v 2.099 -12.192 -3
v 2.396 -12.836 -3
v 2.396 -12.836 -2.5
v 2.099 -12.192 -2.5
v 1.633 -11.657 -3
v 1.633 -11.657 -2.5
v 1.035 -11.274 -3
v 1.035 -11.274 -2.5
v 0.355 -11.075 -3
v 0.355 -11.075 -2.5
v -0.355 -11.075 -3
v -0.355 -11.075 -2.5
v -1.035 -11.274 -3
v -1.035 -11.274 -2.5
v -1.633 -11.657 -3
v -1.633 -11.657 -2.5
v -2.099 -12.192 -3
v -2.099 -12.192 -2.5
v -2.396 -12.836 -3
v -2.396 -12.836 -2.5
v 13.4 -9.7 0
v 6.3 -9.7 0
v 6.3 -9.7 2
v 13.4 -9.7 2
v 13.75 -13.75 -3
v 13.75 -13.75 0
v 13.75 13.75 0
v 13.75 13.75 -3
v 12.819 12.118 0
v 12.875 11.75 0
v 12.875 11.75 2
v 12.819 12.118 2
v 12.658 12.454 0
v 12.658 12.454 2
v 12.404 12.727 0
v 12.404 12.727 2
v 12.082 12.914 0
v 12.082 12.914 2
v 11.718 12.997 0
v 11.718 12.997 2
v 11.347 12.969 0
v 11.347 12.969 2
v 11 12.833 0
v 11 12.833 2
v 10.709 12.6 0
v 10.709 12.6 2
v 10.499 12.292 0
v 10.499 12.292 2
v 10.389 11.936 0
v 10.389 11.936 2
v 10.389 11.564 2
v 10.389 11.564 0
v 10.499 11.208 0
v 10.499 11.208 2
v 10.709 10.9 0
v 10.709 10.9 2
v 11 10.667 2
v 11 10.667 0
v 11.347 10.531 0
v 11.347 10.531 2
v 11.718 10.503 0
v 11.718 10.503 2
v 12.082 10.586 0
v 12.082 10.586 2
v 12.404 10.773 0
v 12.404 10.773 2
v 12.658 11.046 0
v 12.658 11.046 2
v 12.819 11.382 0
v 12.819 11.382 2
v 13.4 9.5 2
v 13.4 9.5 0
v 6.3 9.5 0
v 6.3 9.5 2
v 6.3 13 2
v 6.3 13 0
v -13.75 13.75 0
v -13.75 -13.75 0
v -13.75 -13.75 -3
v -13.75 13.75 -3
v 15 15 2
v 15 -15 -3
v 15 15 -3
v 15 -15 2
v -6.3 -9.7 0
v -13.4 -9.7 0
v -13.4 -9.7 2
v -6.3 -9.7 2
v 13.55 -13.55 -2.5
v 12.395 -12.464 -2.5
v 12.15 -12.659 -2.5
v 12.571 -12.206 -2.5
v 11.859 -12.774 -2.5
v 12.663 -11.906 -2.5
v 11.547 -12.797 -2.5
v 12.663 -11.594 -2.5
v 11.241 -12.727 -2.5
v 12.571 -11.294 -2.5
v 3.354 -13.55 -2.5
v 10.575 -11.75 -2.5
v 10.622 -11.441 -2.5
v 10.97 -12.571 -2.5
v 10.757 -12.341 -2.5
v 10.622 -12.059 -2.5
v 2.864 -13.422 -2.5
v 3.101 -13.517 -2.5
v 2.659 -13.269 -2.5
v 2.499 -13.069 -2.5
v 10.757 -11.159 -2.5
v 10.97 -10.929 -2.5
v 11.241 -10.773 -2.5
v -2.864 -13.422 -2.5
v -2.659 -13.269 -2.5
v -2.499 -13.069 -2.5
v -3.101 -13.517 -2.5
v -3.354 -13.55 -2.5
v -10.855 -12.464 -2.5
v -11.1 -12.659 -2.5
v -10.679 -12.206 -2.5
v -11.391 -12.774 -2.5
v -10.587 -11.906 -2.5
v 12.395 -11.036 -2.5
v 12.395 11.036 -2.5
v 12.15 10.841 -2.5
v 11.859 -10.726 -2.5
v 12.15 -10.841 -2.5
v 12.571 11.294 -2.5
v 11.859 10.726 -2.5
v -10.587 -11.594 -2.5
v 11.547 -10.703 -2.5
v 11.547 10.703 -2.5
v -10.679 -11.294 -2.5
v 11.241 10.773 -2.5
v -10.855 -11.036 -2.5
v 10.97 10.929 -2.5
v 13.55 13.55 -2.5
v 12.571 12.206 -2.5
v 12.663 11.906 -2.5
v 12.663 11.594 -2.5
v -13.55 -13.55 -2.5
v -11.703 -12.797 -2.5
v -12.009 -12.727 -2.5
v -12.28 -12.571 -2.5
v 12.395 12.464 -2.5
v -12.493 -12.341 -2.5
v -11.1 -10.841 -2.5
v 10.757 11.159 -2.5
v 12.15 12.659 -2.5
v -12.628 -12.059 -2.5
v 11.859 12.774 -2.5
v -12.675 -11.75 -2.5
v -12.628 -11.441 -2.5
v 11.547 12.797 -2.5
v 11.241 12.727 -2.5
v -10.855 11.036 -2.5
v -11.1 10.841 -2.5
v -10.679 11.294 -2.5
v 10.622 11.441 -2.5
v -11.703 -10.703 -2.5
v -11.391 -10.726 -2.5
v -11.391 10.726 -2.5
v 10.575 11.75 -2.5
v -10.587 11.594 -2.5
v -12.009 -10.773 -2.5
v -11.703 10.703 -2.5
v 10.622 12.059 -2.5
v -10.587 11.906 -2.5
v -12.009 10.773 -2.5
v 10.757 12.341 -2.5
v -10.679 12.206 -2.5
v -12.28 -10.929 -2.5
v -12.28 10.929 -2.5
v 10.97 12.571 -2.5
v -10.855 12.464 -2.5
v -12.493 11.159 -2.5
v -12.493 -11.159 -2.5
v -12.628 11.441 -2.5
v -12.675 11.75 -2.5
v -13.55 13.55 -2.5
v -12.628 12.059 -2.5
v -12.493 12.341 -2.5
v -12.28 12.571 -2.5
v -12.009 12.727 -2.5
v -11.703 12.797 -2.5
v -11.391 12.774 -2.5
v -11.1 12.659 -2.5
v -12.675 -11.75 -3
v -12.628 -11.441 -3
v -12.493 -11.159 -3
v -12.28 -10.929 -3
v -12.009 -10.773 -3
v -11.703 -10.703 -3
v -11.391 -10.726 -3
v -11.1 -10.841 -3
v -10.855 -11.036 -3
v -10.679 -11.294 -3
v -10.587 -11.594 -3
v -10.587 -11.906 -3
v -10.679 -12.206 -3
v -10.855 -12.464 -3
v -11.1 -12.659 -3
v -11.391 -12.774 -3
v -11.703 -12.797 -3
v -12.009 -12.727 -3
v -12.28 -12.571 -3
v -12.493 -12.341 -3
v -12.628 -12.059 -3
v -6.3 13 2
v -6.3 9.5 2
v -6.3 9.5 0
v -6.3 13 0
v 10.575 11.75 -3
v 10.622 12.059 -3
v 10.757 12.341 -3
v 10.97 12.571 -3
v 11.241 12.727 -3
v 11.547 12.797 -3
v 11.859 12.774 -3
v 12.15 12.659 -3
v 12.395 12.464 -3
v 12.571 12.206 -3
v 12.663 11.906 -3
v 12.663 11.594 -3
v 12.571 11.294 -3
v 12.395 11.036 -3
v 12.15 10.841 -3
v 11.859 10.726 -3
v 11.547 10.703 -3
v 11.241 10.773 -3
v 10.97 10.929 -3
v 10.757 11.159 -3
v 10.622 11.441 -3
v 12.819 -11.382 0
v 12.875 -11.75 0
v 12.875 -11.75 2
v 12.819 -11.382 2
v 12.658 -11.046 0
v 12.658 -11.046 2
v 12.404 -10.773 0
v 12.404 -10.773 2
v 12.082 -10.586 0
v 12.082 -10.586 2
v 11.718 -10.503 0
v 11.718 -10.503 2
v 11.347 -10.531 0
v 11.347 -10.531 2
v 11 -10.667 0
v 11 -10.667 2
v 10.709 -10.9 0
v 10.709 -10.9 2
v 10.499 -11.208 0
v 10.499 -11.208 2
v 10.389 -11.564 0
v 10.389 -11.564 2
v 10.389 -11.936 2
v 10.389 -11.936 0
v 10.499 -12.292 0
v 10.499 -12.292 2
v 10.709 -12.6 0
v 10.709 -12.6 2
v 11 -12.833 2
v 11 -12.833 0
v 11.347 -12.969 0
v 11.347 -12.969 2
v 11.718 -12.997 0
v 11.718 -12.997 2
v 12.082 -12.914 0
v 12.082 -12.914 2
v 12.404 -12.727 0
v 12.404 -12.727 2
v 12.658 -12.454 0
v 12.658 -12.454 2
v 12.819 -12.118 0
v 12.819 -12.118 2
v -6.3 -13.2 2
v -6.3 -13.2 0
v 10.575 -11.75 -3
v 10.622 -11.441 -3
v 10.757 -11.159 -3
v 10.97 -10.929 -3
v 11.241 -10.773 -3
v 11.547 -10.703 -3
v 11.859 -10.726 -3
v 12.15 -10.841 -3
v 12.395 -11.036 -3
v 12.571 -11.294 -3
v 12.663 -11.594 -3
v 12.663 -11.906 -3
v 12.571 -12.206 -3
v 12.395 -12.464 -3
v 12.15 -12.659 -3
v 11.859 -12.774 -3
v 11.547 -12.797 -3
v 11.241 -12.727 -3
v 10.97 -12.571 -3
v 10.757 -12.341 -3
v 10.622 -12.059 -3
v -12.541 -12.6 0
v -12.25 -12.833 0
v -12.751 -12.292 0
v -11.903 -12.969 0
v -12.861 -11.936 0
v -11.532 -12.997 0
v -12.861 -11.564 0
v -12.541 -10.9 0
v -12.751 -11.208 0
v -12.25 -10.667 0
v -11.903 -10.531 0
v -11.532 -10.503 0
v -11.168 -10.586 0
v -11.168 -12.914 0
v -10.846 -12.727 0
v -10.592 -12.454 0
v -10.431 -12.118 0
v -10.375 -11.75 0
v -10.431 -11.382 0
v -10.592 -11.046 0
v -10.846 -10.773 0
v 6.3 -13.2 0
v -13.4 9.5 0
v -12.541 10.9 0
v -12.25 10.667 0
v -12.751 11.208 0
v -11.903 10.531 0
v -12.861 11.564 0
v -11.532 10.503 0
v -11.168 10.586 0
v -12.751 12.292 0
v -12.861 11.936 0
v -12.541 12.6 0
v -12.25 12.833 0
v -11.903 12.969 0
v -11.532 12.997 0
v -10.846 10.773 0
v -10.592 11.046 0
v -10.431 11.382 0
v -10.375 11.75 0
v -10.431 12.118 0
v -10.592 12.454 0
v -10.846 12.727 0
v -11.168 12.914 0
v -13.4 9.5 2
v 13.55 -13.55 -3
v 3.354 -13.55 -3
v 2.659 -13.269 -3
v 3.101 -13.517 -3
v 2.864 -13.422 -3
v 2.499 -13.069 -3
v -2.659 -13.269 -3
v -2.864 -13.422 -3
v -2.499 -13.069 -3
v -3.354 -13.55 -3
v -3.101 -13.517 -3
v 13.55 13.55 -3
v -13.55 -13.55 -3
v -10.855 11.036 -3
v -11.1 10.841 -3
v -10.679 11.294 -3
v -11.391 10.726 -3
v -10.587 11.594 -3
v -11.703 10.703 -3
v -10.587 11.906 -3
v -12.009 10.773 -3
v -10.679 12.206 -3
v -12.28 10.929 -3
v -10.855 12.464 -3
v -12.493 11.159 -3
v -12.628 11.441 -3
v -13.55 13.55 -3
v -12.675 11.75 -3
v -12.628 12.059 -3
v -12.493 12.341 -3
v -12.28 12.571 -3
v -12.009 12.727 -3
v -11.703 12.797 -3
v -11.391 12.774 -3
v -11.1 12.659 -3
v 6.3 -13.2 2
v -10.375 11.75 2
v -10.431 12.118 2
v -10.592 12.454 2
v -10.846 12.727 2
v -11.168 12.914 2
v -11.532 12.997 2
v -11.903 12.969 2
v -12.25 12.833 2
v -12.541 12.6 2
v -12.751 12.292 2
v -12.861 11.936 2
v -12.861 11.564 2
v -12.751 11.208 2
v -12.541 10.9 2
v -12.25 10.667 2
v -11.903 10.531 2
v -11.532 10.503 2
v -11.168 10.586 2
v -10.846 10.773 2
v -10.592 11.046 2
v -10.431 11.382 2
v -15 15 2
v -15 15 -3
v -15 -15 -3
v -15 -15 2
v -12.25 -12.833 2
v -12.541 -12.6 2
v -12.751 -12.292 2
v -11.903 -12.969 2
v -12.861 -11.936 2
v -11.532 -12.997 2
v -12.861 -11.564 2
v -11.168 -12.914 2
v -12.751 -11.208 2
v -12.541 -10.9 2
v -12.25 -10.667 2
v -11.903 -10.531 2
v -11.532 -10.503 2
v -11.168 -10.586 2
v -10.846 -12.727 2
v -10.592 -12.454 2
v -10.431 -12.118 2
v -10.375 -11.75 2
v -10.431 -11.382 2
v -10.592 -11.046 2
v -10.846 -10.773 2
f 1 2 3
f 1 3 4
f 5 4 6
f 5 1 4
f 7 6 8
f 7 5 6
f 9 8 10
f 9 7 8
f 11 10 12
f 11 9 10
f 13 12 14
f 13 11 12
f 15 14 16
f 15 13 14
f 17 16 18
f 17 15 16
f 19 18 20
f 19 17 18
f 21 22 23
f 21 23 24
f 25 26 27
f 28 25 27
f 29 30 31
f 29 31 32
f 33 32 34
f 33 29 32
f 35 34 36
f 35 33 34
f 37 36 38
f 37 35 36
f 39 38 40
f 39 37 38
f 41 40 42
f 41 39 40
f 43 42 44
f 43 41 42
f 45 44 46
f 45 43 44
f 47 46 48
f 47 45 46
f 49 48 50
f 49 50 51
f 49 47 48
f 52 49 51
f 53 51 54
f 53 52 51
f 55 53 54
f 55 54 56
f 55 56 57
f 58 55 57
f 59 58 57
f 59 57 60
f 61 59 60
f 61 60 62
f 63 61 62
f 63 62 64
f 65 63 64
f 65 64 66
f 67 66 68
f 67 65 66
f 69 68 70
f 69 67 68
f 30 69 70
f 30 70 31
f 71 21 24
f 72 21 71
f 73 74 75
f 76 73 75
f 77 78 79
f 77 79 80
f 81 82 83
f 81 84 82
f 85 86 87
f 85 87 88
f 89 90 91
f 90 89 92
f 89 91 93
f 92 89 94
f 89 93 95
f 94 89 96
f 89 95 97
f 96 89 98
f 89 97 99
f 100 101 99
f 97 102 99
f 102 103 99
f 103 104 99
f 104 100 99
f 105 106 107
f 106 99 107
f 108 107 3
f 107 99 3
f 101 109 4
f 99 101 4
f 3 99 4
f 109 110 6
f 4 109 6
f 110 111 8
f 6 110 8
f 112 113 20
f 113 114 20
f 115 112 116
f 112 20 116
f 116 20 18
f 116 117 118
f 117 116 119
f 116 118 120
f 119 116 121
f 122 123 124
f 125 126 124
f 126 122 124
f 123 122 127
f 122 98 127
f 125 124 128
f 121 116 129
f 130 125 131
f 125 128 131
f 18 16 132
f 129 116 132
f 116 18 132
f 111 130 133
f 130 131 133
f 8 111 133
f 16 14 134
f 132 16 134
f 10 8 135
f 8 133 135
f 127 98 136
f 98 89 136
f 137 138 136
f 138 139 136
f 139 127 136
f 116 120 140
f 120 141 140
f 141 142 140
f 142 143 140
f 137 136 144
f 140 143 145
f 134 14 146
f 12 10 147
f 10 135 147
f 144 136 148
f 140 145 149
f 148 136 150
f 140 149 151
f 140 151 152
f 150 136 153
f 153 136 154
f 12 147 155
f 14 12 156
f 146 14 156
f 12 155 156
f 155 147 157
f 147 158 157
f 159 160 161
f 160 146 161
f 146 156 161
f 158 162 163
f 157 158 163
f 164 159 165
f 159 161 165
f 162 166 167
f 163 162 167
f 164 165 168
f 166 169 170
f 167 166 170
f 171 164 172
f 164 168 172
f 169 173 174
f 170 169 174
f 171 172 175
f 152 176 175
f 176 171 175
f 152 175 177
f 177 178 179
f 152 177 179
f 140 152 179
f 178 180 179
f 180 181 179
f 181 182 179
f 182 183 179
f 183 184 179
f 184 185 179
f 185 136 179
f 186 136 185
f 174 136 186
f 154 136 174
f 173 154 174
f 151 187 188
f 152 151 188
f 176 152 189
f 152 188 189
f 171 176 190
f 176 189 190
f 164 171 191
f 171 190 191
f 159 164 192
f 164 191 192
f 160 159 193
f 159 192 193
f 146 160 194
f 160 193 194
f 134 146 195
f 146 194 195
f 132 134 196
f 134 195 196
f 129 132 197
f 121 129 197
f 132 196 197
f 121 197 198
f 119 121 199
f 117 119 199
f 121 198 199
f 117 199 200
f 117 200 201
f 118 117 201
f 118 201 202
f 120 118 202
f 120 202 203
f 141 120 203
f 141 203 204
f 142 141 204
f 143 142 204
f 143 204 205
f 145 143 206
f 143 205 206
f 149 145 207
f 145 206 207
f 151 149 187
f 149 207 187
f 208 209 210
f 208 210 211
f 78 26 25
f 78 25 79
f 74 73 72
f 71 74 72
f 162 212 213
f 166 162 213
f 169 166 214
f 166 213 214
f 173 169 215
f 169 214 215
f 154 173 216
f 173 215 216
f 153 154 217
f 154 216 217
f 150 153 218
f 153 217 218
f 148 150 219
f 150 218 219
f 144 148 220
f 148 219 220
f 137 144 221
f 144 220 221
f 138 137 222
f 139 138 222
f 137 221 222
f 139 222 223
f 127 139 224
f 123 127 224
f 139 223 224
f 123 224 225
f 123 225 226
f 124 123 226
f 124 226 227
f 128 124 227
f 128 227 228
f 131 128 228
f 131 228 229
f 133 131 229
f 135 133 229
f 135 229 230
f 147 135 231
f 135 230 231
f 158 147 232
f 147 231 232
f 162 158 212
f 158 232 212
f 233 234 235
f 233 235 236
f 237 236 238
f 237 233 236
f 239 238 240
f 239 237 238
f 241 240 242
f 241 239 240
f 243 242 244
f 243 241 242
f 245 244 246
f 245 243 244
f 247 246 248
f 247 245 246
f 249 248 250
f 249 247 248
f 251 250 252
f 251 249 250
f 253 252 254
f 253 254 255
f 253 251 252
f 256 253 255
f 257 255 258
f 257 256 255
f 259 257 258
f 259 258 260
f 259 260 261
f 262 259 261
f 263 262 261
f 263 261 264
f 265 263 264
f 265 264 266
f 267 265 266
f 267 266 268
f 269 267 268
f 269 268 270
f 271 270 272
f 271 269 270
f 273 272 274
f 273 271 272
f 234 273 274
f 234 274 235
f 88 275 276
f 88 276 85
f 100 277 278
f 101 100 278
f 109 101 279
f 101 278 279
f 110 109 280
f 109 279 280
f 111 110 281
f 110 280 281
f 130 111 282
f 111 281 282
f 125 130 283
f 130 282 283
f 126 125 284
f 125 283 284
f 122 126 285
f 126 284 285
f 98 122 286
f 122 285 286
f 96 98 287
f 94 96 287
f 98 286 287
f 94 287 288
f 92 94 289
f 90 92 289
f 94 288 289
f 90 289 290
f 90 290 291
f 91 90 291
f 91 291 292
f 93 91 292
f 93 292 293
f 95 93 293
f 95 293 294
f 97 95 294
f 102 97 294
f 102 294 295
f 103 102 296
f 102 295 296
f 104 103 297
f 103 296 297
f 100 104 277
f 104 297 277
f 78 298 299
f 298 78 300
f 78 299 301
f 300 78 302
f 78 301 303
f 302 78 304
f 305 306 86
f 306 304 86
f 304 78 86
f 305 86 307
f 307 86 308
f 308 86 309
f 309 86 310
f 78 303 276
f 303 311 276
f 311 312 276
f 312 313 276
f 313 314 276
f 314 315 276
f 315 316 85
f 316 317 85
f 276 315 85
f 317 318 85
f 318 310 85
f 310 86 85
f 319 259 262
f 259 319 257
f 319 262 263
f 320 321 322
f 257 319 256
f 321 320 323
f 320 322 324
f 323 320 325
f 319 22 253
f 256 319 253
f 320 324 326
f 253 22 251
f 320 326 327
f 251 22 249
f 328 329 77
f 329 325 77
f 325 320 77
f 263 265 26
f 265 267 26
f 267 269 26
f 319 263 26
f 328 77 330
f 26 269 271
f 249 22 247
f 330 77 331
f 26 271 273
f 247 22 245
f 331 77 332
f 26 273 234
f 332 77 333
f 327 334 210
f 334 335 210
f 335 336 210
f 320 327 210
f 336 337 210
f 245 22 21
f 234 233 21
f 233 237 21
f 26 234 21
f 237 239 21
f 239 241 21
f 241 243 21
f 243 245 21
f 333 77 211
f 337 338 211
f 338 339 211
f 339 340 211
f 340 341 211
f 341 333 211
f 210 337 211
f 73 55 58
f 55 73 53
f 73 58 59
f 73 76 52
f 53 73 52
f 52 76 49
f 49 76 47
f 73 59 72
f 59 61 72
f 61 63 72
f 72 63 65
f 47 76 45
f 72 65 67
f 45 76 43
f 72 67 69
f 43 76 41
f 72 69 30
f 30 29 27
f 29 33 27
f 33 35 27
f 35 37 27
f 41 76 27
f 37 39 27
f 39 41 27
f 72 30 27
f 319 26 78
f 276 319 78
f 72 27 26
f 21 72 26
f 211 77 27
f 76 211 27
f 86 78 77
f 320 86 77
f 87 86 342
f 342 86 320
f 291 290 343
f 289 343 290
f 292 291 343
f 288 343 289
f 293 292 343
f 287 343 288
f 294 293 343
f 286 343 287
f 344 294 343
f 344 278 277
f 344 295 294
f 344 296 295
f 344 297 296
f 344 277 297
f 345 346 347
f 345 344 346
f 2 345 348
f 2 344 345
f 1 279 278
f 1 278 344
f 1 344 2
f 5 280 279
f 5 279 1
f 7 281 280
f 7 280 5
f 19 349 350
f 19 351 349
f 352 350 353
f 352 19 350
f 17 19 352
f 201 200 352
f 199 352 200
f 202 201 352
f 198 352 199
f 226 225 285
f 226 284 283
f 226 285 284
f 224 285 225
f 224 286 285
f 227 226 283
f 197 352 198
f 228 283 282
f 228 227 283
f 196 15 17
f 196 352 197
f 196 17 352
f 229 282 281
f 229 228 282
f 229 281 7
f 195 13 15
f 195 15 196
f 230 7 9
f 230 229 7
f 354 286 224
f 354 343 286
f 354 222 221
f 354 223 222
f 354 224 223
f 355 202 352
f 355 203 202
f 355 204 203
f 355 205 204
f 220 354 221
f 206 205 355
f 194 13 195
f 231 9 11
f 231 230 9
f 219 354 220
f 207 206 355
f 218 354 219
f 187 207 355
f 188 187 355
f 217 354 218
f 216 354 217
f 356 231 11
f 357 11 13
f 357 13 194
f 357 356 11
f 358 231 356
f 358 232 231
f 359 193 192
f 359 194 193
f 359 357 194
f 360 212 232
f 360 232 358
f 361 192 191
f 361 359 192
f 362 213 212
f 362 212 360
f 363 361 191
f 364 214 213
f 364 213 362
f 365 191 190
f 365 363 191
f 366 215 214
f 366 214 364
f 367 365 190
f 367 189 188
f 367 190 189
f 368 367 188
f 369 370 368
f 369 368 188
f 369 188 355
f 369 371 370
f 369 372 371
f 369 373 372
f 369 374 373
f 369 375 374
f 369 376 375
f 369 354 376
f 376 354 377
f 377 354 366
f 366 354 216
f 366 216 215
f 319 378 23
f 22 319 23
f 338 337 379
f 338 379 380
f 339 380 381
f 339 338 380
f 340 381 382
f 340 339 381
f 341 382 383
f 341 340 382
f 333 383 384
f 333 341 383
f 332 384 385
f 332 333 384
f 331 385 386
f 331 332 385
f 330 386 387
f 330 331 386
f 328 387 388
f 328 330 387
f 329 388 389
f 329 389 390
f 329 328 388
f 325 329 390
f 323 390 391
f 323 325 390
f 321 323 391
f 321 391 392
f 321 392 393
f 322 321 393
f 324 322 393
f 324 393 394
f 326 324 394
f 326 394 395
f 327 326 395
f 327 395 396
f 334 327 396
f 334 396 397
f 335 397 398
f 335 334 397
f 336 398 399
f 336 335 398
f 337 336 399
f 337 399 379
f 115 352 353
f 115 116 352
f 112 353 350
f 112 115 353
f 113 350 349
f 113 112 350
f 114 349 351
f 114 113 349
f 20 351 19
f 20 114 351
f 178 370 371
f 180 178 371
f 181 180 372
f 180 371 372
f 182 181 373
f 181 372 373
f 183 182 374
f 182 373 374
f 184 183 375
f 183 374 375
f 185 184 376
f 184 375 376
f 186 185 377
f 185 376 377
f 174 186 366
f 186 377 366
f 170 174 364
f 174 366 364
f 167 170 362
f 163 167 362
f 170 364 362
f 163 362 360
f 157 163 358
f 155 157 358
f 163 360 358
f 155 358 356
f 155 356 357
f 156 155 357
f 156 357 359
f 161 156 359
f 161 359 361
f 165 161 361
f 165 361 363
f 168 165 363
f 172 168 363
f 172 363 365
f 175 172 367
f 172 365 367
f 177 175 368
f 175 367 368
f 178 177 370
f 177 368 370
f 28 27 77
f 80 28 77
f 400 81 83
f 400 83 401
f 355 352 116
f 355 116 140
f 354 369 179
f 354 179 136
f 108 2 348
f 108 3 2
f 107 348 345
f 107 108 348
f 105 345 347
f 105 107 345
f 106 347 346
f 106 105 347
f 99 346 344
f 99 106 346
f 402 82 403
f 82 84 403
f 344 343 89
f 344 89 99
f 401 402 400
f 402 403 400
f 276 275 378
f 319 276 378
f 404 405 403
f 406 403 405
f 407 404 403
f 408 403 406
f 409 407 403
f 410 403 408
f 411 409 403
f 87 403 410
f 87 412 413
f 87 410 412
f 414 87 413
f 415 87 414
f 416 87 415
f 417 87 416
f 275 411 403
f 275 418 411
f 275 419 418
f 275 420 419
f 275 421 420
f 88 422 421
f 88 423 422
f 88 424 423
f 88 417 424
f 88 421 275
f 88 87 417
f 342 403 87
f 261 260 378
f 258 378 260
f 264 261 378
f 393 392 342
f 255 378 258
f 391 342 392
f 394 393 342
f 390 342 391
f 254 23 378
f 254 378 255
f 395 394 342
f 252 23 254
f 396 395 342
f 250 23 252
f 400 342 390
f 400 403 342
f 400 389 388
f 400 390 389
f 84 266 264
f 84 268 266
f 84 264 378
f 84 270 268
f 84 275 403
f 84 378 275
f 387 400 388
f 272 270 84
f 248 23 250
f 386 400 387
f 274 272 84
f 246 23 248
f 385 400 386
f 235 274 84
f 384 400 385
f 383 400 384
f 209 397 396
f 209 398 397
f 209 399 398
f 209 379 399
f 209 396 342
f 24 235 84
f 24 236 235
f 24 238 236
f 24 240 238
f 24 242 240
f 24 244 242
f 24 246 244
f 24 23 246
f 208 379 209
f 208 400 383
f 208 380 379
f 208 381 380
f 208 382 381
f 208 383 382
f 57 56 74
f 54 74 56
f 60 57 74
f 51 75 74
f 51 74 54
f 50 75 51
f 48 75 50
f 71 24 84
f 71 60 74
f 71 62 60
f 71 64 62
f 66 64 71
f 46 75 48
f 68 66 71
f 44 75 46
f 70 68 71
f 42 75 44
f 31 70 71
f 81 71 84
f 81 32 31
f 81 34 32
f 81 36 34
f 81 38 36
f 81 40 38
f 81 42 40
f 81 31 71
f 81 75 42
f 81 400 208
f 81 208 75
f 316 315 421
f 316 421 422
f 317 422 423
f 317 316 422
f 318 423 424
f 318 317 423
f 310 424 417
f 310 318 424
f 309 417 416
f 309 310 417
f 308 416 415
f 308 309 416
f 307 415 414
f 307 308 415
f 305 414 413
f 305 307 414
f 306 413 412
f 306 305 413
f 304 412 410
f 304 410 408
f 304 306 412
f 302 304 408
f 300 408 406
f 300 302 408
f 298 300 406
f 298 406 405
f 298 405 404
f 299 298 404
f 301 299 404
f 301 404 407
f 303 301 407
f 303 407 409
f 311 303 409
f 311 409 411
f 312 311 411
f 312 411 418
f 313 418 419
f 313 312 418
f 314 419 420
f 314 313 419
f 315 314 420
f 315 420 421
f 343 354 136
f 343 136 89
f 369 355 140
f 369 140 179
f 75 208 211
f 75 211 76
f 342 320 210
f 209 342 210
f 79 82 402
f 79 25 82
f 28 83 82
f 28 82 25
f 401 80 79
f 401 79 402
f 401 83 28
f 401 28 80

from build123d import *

# Parameters (mm, degrees)
SKETCH1_W           = 30
SKETCH1_H           = 30
SKETCH1_R           = 1.25
SKETCH1_W_2         = 26.8
SKETCH1_H_2         = 19.2
BOSS_EXTRUDE1_DEPTH = 2
SKETCH2_W           = 12.6
SKETCH2_H           = 3.5
CUT_EXTRUDE1_DEPTH  = 3
SKETCH3_W           = 30
SKETCH3_H           = 30
SKETCH3_W_2         = 27.5
SKETCH3_H_2         = 27.5
BOSS_EXTRUDE3_DEPTH = 3
SKETCH4_R           = 1.05
BOSS_EXTRUDE4_DEPTH = 0.5
FILLET1_R           = 1


with BuildPart() as part:
    # Sketch1 → Boss-Extrude1 (new body)
    with BuildSketch(Plane.XY):
        Rectangle(SKETCH1_W, SKETCH1_H)
        with Locations((-11.625, 11.75)):
            Circle(SKETCH1_R, mode=Mode.SUBTRACT)
        with Locations((11.625, 11.75)):
            Circle(SKETCH1_R, mode=Mode.SUBTRACT)
        with Locations((11.625, -11.75)):
            Circle(SKETCH1_R, mode=Mode.SUBTRACT)
        with Locations((-11.625, -11.75)):
            Circle(SKETCH1_R, mode=Mode.SUBTRACT)
        with Locations((0, -0.1)):
            Rectangle(SKETCH1_W_2, SKETCH1_H_2, mode=Mode.SUBTRACT)
    extrude(amount=BOSS_EXTRUDE1_DEPTH)

    # Sketch2 → Cut-Extrude1 (cut)
    with BuildSketch(Plane.XY.offset(2)):
        with Locations((0, -11.45)):
            Rectangle(SKETCH2_W, SKETCH2_H)
        with Locations((0, 11.25)):
            Rectangle(SKETCH2_W, SKETCH2_H)
    extrude(amount=-CUT_EXTRUDE1_DEPTH, mode=Mode.SUBTRACT)

    # Sketch3 → Boss-Extrude3 (add)
    with BuildSketch(Plane(origin=(0, 0, 0), x_dir=(-1, 0, 0), z_dir=(0, 0, -1))):
        Rectangle(SKETCH3_W, SKETCH3_H)
        Rectangle(SKETCH3_W_2, SKETCH3_H_2, mode=Mode.SUBTRACT)
    extrude(amount=BOSS_EXTRUDE3_DEPTH)


with BuildPart() as body_2:
    # Sketch4 → Boss-Extrude4 (new body)
    with BuildSketch(Plane(origin=(0, 0, -3), x_dir=(-1, 0, 0), z_dir=(0, 0, -1))):
        with BuildLine():
            Line((2.5, -13.55), (13.55, -13.55))
            Line((13.55, -13.55), (13.55, 13.55))
            Line((13.55, 13.55), (-13.55, 13.55))
            Line((-13.55, 13.55), (-13.55, -13.55))
            Line((-13.55, -13.55), (-2.5, -13.55))
            ThreePointArc((-2.5, -13.55), (0, -11.05), (2.5, -13.55))
        make_face()
        with Locations((-11.625, 11.75)):
            Circle(SKETCH4_R, mode=Mode.SUBTRACT)
        with Locations((11.625, 11.75)):
            Circle(SKETCH4_R, mode=Mode.SUBTRACT)
        with Locations((-11.625, -11.75)):
            Circle(SKETCH4_R, mode=Mode.SUBTRACT)
        with Locations((11.625, -11.75)):
            Circle(SKETCH4_R, mode=Mode.SUBTRACT)
    extrude(amount=-BOSS_EXTRUDE4_DEPTH)

    # Fillet1
    fillet1_edges = [body_2.edges().sort_by_distance(p)[0] for p in [
        (2.5, -13.55, -2.75),
        (-2.5, -13.55, -2.75),
    ]]
    fillet(fillet1_edges, radius=FILLET1_R)


solid = Compound([part.part, body_2.part])
